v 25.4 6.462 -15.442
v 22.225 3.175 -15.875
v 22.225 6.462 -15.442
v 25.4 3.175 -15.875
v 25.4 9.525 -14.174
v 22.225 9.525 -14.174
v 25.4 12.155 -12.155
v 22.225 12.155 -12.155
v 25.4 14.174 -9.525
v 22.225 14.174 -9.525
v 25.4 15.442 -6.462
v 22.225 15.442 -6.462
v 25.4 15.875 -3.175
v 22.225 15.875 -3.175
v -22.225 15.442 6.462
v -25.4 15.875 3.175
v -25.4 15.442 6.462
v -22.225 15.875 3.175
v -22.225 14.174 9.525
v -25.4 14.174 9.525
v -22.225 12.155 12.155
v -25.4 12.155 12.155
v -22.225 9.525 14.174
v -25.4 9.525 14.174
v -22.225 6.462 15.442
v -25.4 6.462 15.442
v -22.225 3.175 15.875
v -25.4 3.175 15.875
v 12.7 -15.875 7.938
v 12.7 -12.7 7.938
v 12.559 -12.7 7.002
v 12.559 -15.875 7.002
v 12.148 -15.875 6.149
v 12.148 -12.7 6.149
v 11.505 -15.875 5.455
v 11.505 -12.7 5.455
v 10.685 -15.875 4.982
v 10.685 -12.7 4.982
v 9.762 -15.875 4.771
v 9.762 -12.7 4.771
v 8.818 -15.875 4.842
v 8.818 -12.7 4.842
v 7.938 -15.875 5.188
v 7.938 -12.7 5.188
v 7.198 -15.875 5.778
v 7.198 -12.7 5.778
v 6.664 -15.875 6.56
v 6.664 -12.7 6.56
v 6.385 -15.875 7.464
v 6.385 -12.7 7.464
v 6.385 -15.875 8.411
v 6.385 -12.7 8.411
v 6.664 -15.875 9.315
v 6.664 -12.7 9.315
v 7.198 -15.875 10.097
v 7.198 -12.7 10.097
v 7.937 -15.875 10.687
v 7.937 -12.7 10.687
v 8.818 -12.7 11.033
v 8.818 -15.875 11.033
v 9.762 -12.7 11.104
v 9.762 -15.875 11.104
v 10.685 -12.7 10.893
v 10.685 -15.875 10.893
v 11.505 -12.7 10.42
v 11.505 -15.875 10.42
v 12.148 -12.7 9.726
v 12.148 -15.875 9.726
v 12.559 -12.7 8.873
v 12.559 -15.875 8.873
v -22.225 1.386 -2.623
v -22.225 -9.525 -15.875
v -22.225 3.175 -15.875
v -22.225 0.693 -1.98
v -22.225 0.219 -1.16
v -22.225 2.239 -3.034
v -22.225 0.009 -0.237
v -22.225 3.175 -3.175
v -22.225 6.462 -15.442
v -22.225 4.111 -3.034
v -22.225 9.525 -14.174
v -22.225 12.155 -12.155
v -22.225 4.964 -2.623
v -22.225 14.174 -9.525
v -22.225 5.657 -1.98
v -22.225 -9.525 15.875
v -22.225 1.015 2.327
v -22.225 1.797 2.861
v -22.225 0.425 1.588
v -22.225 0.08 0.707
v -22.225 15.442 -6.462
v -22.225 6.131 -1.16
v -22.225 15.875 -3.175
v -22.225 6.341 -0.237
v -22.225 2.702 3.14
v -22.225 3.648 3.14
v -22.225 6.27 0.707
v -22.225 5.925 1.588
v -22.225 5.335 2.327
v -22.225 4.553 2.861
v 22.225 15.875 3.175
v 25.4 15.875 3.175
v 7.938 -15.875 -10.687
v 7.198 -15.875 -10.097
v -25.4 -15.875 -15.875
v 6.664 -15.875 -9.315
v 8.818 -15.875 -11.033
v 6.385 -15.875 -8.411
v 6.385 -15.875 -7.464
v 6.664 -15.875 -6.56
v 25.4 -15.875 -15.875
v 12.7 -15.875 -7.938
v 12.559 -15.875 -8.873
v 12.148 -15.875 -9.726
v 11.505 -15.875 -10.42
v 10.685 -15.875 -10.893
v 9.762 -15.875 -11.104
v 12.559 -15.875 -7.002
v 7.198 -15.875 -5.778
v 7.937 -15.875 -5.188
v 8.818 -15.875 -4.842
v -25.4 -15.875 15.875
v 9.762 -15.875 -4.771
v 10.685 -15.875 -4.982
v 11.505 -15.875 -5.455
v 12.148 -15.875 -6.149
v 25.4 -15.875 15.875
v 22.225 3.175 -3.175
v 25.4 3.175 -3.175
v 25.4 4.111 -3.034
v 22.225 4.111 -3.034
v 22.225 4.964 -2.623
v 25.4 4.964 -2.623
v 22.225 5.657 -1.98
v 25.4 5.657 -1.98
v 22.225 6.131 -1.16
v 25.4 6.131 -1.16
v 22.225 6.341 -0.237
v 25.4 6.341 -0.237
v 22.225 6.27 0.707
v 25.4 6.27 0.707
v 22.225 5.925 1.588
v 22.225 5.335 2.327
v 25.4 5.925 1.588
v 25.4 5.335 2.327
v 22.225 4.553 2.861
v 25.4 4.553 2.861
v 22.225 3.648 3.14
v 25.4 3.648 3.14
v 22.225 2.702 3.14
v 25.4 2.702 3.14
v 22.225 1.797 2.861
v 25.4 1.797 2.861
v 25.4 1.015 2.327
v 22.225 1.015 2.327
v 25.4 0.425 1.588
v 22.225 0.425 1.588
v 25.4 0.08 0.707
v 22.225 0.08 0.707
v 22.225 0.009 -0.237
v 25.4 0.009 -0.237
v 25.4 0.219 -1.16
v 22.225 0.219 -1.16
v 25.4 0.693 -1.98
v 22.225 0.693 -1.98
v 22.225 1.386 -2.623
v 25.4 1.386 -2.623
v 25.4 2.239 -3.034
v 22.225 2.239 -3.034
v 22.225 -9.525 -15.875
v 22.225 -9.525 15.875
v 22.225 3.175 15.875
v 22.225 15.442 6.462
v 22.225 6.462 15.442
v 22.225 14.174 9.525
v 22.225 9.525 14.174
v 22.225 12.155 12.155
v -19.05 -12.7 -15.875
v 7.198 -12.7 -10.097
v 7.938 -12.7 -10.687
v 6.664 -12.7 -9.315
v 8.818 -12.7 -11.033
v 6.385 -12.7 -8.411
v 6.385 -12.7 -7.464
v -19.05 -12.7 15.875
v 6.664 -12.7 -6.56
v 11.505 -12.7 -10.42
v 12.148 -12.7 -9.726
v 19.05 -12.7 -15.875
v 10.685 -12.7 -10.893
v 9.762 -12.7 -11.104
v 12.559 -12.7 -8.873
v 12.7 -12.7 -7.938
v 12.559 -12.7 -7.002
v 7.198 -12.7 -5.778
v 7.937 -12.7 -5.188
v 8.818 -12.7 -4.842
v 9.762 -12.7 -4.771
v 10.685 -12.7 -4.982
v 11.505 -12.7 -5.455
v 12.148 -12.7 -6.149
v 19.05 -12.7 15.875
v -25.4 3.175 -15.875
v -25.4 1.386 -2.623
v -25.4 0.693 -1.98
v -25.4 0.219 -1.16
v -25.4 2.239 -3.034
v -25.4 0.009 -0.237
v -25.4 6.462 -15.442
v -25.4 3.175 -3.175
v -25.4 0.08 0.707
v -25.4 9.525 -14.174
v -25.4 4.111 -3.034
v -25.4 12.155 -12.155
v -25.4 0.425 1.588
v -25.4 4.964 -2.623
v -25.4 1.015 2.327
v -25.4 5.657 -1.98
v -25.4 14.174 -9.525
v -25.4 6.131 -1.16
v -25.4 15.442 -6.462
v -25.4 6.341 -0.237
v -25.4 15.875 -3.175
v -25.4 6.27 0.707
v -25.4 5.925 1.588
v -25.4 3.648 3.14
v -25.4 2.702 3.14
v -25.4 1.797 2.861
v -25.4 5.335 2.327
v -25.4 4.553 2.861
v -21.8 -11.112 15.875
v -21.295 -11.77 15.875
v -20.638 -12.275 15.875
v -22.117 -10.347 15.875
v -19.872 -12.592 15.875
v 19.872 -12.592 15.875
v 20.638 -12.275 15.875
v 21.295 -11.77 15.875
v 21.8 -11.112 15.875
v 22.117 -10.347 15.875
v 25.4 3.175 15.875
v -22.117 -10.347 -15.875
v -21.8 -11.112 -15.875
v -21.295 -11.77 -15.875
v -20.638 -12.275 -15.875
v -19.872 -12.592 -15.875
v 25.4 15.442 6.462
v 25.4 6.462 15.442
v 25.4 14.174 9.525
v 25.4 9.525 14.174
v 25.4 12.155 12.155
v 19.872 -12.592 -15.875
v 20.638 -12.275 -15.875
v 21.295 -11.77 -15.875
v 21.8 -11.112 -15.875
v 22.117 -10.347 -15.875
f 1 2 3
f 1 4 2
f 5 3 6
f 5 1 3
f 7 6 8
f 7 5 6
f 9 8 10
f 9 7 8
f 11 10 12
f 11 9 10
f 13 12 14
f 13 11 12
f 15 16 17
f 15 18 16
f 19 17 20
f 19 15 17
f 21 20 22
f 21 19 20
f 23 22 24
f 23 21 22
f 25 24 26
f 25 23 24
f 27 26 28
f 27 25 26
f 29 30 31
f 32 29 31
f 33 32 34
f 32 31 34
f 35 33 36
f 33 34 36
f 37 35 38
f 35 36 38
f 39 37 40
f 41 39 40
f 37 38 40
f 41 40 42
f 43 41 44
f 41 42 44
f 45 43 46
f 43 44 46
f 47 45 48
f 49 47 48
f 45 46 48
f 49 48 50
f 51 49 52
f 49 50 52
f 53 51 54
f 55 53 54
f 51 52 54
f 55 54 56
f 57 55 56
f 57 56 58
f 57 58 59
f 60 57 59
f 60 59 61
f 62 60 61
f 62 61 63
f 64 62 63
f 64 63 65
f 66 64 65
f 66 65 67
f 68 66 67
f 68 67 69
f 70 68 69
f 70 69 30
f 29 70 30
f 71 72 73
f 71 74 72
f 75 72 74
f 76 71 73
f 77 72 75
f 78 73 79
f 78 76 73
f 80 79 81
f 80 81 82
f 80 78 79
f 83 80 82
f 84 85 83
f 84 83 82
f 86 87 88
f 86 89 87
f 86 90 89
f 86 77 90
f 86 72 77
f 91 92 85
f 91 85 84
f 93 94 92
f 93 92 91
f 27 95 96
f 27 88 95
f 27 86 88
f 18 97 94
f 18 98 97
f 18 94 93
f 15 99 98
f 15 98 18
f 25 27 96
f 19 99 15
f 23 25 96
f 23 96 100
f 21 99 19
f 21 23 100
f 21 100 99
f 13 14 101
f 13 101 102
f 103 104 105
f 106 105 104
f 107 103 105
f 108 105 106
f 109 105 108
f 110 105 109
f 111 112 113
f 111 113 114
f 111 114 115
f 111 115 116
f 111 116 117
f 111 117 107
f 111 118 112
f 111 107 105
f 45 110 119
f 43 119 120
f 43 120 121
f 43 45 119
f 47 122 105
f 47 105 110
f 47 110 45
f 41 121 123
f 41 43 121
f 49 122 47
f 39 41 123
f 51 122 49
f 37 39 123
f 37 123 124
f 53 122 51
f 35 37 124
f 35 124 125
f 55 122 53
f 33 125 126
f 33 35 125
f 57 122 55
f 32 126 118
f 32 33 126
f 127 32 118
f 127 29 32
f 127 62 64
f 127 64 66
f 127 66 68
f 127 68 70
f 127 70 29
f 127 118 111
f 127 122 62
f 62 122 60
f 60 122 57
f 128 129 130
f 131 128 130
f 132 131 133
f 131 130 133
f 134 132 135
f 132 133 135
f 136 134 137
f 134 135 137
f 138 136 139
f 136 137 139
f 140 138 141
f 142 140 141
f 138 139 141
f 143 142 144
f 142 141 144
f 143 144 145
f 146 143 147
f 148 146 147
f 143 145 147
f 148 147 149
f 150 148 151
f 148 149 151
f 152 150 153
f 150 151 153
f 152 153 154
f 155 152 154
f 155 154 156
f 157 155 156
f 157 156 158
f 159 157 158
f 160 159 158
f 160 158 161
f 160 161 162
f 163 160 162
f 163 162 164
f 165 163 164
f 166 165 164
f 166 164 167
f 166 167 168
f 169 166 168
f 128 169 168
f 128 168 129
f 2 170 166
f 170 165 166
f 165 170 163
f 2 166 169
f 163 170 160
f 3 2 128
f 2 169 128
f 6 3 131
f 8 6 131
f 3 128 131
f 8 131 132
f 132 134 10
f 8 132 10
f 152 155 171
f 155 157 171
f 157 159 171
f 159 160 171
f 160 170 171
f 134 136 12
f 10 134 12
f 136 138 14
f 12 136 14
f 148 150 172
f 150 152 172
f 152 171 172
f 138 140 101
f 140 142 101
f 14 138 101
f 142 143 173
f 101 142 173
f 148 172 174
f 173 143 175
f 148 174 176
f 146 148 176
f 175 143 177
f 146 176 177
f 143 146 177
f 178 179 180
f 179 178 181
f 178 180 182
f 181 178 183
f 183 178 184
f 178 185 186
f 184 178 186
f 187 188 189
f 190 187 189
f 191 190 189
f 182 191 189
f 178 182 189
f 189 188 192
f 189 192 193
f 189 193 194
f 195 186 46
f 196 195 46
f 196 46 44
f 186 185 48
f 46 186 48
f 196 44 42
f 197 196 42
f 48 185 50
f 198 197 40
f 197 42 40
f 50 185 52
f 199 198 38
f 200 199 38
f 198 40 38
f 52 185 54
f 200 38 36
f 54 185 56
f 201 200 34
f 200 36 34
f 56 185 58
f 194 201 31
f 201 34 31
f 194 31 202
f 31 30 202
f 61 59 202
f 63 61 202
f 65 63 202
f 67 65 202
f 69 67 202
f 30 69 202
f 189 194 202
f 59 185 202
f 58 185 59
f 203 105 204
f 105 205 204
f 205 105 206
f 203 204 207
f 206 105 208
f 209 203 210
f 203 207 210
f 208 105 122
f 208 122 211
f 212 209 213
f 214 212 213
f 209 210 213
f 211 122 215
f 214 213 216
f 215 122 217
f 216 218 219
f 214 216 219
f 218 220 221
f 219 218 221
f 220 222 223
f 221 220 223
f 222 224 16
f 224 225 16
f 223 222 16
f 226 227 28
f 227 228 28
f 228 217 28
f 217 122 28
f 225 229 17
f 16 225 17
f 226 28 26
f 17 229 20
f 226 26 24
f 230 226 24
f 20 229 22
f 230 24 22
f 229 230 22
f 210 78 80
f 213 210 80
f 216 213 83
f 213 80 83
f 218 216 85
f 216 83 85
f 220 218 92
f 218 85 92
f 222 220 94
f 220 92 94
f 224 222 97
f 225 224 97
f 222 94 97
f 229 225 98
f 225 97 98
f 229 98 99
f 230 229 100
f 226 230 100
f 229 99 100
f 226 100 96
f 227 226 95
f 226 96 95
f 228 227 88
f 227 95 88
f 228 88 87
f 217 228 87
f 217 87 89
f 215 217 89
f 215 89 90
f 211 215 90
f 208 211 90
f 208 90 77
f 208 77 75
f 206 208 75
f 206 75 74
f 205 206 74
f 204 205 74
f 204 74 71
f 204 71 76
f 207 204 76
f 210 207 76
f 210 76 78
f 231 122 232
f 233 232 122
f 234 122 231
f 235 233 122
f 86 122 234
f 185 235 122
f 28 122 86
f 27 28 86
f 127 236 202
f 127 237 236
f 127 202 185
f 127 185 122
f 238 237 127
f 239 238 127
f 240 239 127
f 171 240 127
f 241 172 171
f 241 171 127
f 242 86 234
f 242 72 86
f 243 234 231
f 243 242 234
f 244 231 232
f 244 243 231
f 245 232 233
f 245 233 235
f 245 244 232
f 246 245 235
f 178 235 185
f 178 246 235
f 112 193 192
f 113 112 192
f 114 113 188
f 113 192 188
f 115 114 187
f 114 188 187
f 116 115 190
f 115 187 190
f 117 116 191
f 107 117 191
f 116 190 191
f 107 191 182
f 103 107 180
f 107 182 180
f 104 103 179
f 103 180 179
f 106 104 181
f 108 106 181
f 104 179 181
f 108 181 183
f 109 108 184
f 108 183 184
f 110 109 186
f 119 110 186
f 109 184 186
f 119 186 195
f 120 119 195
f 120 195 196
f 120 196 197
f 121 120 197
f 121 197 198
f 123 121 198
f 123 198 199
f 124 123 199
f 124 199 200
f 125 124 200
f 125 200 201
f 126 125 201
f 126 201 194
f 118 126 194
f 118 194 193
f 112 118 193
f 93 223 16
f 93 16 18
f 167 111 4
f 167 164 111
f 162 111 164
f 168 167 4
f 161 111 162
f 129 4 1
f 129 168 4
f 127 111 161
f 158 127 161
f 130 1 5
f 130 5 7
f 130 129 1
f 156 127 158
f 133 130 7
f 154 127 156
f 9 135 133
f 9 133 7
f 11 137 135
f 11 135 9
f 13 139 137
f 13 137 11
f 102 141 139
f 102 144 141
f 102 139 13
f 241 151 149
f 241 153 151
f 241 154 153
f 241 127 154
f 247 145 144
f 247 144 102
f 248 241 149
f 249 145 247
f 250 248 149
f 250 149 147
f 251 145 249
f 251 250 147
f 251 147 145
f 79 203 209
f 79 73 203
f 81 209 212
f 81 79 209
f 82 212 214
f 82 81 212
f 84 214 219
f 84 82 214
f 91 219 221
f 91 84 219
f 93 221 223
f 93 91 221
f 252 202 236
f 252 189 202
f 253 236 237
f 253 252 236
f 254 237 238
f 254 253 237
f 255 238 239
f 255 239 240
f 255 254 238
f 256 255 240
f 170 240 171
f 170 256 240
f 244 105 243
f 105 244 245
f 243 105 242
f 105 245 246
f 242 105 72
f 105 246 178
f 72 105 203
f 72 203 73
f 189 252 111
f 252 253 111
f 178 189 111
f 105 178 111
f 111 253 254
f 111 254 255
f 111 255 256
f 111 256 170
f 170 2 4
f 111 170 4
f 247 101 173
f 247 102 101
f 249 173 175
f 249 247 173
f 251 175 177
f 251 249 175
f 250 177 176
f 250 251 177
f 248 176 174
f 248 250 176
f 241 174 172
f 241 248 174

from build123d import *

# Parameters (mm, degrees)
SKETCH1_W           = 50.8
SKETCH1_H           = 31.75
BOSS_EXTRUDE1_DEPTH = 15.875
SKETCH2_W           = 44.45
SKETCH2_H           = 28.575
CUT_EXTRUDE1_DEPTH  = 32.75
SKETCH3_R           = 3.175
CUT_EXTRUDE2_DEPTH  = 4.175
FILLET1_R           = 3.175
SKETCH4_R           = 3.175
CUT_EXTRUDE3_DEPTH  = 51.8
FILLET2_R           = 12.7


with BuildPart() as part:
    # Sketch1 → Boss-Extrude1 (new body, symmetric)
    with BuildSketch(Plane.XY):
        Rectangle(SKETCH1_W, SKETCH1_H)
    extrude(amount=BOSS_EXTRUDE1_DEPTH, both=True)

    # Sketch2 → Cut-Extrude1 (cut, through all)
    with BuildSketch(Plane.XY.offset(15.875)):
        with Locations((0, 1.5875)):
            Rectangle(SKETCH2_W, SKETCH2_H)
    extrude(amount=-CUT_EXTRUDE1_DEPTH, mode=Mode.SUBTRACT)

    # Sketch3 → Cut-Extrude2 (cut, through all)
    with BuildSketch(Plane(origin=(0, -12.7, 0), x_dir=(1, 0, 0), z_dir=(0, 1, 0))):
        with Locations((9.525, 7.9375)):
            Circle(SKETCH3_R)
        with Locations((9.525, -7.9375)):
            Circle(SKETCH3_R)
    extrude(amount=-CUT_EXTRUDE2_DEPTH, mode=Mode.SUBTRACT)

    # Fillet1
    fillet1_edges = [part.edges().sort_by_distance(p)[0] for p in [
        (-22.225, -12.7, 0),
        (22.225, -12.7, 0),
    ]]
    fillet(fillet1_edges, radius=FILLET1_R)

    # Sketch4 → Cut-Extrude3 (cut, through all)
    with BuildSketch(Plane(origin=(25.4, 0, 0), x_dir=(0, 0, -1), z_dir=(1, 0, 0))):
        with Locations((0, 3.175)):
            Circle(SKETCH4_R)
    extrude(amount=-CUT_EXTRUDE3_DEPTH, mode=Mode.SUBTRACT)

    # Fillet2
    fillet2_edges = [part.edges().sort_by_distance(p)[0] for p in [
        (-23.8125, 15.875, -15.875),
        (-23.8125, 15.875, 15.875),
        (23.8125, 15.875, -15.875),
        (23.8125, 15.875, 15.875),
    ]]
    fillet(fillet2_edges, radius=FILLET2_R)


solid = part.part
